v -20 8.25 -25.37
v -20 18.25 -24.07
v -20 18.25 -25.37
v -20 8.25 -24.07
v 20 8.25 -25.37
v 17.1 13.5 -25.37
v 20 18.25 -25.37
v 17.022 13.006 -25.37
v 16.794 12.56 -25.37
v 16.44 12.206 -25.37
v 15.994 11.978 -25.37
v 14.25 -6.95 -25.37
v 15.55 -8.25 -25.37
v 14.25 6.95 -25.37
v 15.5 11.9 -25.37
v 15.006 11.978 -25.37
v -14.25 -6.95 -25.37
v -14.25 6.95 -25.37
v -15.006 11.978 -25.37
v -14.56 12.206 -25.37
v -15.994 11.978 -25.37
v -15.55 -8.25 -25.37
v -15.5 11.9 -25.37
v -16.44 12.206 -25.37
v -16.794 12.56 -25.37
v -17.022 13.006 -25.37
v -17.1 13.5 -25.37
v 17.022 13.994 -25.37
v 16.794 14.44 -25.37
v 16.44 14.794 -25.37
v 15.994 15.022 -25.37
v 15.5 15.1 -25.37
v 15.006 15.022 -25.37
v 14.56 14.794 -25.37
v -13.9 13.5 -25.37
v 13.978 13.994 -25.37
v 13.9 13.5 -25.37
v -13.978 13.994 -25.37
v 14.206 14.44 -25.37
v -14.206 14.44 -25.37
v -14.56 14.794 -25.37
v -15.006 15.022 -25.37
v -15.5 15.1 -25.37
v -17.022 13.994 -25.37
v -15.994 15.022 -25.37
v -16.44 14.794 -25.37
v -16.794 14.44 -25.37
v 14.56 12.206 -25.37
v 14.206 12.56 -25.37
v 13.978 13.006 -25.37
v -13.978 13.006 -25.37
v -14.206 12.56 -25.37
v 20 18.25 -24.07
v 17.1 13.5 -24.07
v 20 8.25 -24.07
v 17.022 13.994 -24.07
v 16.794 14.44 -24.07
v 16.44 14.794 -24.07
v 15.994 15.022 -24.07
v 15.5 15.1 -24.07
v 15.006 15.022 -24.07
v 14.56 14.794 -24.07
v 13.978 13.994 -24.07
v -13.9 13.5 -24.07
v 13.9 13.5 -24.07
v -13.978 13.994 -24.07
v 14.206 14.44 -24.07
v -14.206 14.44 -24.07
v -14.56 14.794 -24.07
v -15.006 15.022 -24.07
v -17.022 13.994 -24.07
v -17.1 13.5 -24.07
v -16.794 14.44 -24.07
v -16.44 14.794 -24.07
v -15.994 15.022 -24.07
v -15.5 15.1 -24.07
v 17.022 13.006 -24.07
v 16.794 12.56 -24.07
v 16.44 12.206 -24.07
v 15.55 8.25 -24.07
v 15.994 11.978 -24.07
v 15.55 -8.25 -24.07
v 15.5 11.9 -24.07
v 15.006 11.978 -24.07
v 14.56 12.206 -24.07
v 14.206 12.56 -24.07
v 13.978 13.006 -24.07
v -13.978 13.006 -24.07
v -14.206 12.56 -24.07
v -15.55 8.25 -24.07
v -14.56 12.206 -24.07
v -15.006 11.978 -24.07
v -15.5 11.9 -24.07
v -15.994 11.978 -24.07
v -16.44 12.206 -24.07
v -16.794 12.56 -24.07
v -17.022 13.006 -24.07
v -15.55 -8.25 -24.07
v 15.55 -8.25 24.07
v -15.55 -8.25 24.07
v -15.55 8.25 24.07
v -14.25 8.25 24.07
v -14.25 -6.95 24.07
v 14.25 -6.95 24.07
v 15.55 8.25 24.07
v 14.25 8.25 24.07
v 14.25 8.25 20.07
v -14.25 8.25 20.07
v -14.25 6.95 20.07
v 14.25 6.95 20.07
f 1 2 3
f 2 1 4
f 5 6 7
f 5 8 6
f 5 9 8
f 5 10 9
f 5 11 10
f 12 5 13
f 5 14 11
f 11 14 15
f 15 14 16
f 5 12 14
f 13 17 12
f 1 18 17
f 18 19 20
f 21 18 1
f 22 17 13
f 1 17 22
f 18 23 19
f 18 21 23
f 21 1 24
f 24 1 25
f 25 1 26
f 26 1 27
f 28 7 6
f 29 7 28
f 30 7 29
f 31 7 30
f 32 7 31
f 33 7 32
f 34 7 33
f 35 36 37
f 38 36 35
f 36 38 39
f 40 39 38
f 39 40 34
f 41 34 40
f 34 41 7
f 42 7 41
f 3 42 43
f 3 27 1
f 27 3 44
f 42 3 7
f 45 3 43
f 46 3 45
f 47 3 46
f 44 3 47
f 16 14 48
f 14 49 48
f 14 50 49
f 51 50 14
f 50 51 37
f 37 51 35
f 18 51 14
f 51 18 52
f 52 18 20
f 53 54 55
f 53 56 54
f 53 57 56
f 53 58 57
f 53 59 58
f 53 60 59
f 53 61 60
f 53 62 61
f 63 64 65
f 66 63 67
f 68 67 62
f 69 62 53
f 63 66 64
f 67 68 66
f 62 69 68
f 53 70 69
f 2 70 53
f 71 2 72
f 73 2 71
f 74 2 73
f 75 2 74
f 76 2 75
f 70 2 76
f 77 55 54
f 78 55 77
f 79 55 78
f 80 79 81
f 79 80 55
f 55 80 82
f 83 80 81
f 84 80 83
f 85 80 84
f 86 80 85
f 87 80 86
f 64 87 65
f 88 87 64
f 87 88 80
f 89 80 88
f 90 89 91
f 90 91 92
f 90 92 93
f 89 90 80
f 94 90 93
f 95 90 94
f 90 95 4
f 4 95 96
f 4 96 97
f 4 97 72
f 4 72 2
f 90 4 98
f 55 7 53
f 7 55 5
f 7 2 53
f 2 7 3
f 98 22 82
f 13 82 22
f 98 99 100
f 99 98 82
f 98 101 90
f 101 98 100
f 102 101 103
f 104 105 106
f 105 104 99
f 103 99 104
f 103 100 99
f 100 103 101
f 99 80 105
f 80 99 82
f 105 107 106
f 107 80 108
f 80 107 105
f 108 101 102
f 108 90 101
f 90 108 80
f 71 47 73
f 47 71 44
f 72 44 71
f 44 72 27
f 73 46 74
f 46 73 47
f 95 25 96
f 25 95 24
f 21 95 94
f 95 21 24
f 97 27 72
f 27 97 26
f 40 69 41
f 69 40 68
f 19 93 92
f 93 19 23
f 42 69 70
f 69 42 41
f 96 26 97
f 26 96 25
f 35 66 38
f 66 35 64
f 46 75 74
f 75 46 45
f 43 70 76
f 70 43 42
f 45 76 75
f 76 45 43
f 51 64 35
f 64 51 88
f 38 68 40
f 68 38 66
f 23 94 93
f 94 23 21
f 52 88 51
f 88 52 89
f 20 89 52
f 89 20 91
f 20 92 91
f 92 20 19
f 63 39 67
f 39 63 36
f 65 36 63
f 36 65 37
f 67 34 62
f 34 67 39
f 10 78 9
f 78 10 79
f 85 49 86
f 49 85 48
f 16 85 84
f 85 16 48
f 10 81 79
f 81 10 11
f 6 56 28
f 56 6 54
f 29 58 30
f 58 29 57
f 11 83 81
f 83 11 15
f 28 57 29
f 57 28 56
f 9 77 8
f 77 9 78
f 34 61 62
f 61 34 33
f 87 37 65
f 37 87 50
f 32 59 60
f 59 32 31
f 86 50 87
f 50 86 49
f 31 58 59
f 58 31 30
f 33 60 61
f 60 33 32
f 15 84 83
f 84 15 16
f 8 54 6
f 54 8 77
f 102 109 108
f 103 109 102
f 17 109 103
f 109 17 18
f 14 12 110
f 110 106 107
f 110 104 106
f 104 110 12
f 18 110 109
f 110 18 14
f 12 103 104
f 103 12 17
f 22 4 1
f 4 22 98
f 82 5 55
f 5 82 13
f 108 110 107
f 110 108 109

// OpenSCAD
//by Eric Hughes specifically for a MakerFront i3Pro
//circle precision
$fn=20;
//inner switch width
ix=28.5;//28.3
//inner switch depth
iy=13.9;
//wall thickness
wt=1.3;//1.2
//motor + bracket height
mbz= 43.14;
//customize height lower than motor in front and sides (covers wires, zero if flush with motor)
mz = 5;
//customize height lower than motor in back (zero if flush)
mzb = 1;
//distance between both scres holes
hx=31;
//overhang into motermount bracket
mby=10;
//overhang into motermount bracket
mbx=40;

rotate([0,180,0]){
difference(){
    union(){
        TopPlate();
        cube([2*wt+ix, 2*wt+iy, mbz+mz], center=true);
    }
    cube([ix, iy, 100], center=true);
    LeftTriangleCut();
    RightTriangleCut();
    screwholes();
    BottomCut();
}}

module BottomCut(){
    translate([0,wt+.01,-50-(mbz+mz)/2+(mz-mzb)])
     cube([ix, iy, 100], center=true);
}


module TopPlate(){
translate([0,mby/2,(mbz+mz+wt)/2]){
cube([mbx,mby+2*wt+iy, wt],center=true);}}

module RightTriangleCut(){
linear_extrude(height=100, center=true){
 polygon(points=[[-(2*wt+ix)/2,-(2*wt+iy)/2-.001],[-(mbx)/2-.001,-(2*wt+iy)/2-.001],[-(mbx)/2,(2*wt+iy)/2]]);}}

module LeftTriangleCut(){
    mirror([1,0,0]) RightTriangleCut();
}

module screwholes(){
translate([0,(2*wt+iy)/2+5.25,]){
translate([hx/2,0,0]){
 cylinder(100, d=3.2, center=true);
}
translate([-hx/2,0,0]){
 cylinder(100, d=3.2, center=true);
}}}
